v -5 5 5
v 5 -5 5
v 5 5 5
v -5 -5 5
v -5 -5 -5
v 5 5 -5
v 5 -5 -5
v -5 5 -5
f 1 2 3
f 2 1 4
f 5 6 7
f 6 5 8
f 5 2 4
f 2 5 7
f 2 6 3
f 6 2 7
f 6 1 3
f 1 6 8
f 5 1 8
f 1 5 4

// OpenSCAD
// file: utils.scad
// utils functions #######################

// piece id tester #######################

function tstid(id) = (ext_id == -1 || ext_id == id)? true : false;

// polygon slice #########################

module slice(points,thickness) {
  translate([0,0,-1]) linear_extrude(thickness) polygon(points);
}

// mirror path ###########################

function mirror_x(path) = concat(path,[for (i = [len(path)-1:-1:0]) [-1*path[i][0],path[i][1]]]);

function mirror_y(path) = concat(path,[for (i = [len(path)-1:-1:0]) [path[i][0],-1*path[i][1]]]);

function mirror_xy(path) = mirror_x(mirror_y(path));

function mirror_yx(path) = mirror_y(mirror_x(path));

// math functions ########################

// distance between 2 vectors
function dist_2v(v1,v2) = let (x = v2[0]-v1[0],y = v2[1]-v1[1]) sqrt(x*x+y*y);

// angle of a segment
function ang_2v(v1,v2) = let (x = v2[0]-v1[0],y = v2[1]-v1[1]) atan(y/x);

// arc functions #########################

// arc from 2 points and 1 height
function arc_2p1h(p1,p2,h,n) =
  let (
    ah = abs(h),
    w = dist_2v(p1,p2)/2,hyp = sqrt(ah*ah+w*w),r = (hyp/2)/(ah/hyp),
    //ang = acos(h/hyp)*4,
    //
    dev_ang = (abs(ang_2v(p1,p2))+((p1[0]>p2[0])? 90 : 0))*((p1[1]>p2[1])? -1 : 1),
    sh = (h/abs(h))*((ah<w)? -1 : 1)*sqrt(r*r-w*w),
    //(h/abs(h))
    m = [(p2[0]-p1[0])/2+p1[0],(p2[1]-p1[1])/2+p1[1]],
    c = [cos(dev_ang+90)*sh+m[0],sin(dev_ang+90)*sh+m[1]],
    //
    start_ang = 180+((sh >= 0)? 1 : -1)*abs(acos(w/r))+dev_ang,
    end_ang = ((sh >= 0)? -1 : 1)*abs(acos(w/r))+dev_ang,
    //
    ang = abs(end_ang-start_ang)
    //
  )
  concat(
    [p1],//[c],[[w,sh]],//[[dev_ang,ang]],[[start_ang,end_ang]],//[[ang_2v(p1,c),0]],
    //
    [for (i=[1:n-1]) let (tmp = start_ang-(h/abs(h))*(ang/n)*i) [cos(tmp)*r+c[0],sin(tmp)*r+c[1]]],
    //[for (i=[1:n-1]) let (tmp = start_ang+10*i) [cos(tmp)*r+c[0],sin(tmp)*r+c[1]]],
    //
    [p2]
  );

// half arc from 2 points
function arc_h2p(p1,p2,n) =
  let ()
  concat(
    [p1],
    //
    //
    [p2]
  );

// ortho demi arc
function demi_arc(h,w,n,o=[0,0]) =
  let (hyp = sqrt(h*h+w*w),r = (hyp/2) / (h/hyp),ang = (90-acos(h/hyp))*2)
  concat(
    [[o[0],h+o[1]]],
    [for (i=[1:n-1]) let (tmp = 90-(ang/n)*i) [cos(tmp)*r+o[0],sin(tmp)*r-(r-h)+o[1]]],
    [[w+o[0],o[1]]]
  );

// ortho arc
function arc(h,w,n,o=[0,0]) =
  let (hyp = sqrt(h*h+(w/2)*(w/2)),r = (hyp/2) / (h/hyp),ang = (90-acos(h/hyp))*4)
  concat(
    [[-(w/2)+o[0],o[1]]],
    [for (i=[1:n-1]) let (tmp = 90+(ang/2)-(ang/n)*i) [cos(tmp)*r+o[0],sin(tmp)*r-(r-h)+o[1]]],
    [[w/2+o[0],o[1]]]
  );

// TEST ZONE ########

/*
translate([5,10,0.5]) color("yellow") cube([1,1,1],center=true);
translate([10,5,0.5]) color("yellow") cube([1,1,1],center=true);
translate([7.5,7.5,0.5]) color("pink") cube([1,1,1],center=true);
translate([14.6,14.6,0.5]) color("turquoise") cube([1,1,1],center=true);
translate([0.4,0.4,0.5]) color("turquoise") cube([1,1,1],center=true);
translate([4.4,4.4,0.5]) color("blue") cube([1,1,1],center=true);
translate([10.5,10.5,0.5]) color("blue") cube([1,1,1],center=true);
//translate([9.8,9.8,0.5]) color("blue") cube([1,1,1],center=true);

pts = arc_2p1h([5,10],[10,5],10,5);
echo(pts);
polygon(pts);
*/
// main file
// infos ###########################

//nb pieces : 1
//thickness : 2

// includes ########################

include <utils.scad>;

// variables #######################

ext_id = -1;
all = (ext_id < 0)? true : false;
$fn = 12;

// functions #######################

// composing #######################

if (tstid(1)) cube(10,center=true);
